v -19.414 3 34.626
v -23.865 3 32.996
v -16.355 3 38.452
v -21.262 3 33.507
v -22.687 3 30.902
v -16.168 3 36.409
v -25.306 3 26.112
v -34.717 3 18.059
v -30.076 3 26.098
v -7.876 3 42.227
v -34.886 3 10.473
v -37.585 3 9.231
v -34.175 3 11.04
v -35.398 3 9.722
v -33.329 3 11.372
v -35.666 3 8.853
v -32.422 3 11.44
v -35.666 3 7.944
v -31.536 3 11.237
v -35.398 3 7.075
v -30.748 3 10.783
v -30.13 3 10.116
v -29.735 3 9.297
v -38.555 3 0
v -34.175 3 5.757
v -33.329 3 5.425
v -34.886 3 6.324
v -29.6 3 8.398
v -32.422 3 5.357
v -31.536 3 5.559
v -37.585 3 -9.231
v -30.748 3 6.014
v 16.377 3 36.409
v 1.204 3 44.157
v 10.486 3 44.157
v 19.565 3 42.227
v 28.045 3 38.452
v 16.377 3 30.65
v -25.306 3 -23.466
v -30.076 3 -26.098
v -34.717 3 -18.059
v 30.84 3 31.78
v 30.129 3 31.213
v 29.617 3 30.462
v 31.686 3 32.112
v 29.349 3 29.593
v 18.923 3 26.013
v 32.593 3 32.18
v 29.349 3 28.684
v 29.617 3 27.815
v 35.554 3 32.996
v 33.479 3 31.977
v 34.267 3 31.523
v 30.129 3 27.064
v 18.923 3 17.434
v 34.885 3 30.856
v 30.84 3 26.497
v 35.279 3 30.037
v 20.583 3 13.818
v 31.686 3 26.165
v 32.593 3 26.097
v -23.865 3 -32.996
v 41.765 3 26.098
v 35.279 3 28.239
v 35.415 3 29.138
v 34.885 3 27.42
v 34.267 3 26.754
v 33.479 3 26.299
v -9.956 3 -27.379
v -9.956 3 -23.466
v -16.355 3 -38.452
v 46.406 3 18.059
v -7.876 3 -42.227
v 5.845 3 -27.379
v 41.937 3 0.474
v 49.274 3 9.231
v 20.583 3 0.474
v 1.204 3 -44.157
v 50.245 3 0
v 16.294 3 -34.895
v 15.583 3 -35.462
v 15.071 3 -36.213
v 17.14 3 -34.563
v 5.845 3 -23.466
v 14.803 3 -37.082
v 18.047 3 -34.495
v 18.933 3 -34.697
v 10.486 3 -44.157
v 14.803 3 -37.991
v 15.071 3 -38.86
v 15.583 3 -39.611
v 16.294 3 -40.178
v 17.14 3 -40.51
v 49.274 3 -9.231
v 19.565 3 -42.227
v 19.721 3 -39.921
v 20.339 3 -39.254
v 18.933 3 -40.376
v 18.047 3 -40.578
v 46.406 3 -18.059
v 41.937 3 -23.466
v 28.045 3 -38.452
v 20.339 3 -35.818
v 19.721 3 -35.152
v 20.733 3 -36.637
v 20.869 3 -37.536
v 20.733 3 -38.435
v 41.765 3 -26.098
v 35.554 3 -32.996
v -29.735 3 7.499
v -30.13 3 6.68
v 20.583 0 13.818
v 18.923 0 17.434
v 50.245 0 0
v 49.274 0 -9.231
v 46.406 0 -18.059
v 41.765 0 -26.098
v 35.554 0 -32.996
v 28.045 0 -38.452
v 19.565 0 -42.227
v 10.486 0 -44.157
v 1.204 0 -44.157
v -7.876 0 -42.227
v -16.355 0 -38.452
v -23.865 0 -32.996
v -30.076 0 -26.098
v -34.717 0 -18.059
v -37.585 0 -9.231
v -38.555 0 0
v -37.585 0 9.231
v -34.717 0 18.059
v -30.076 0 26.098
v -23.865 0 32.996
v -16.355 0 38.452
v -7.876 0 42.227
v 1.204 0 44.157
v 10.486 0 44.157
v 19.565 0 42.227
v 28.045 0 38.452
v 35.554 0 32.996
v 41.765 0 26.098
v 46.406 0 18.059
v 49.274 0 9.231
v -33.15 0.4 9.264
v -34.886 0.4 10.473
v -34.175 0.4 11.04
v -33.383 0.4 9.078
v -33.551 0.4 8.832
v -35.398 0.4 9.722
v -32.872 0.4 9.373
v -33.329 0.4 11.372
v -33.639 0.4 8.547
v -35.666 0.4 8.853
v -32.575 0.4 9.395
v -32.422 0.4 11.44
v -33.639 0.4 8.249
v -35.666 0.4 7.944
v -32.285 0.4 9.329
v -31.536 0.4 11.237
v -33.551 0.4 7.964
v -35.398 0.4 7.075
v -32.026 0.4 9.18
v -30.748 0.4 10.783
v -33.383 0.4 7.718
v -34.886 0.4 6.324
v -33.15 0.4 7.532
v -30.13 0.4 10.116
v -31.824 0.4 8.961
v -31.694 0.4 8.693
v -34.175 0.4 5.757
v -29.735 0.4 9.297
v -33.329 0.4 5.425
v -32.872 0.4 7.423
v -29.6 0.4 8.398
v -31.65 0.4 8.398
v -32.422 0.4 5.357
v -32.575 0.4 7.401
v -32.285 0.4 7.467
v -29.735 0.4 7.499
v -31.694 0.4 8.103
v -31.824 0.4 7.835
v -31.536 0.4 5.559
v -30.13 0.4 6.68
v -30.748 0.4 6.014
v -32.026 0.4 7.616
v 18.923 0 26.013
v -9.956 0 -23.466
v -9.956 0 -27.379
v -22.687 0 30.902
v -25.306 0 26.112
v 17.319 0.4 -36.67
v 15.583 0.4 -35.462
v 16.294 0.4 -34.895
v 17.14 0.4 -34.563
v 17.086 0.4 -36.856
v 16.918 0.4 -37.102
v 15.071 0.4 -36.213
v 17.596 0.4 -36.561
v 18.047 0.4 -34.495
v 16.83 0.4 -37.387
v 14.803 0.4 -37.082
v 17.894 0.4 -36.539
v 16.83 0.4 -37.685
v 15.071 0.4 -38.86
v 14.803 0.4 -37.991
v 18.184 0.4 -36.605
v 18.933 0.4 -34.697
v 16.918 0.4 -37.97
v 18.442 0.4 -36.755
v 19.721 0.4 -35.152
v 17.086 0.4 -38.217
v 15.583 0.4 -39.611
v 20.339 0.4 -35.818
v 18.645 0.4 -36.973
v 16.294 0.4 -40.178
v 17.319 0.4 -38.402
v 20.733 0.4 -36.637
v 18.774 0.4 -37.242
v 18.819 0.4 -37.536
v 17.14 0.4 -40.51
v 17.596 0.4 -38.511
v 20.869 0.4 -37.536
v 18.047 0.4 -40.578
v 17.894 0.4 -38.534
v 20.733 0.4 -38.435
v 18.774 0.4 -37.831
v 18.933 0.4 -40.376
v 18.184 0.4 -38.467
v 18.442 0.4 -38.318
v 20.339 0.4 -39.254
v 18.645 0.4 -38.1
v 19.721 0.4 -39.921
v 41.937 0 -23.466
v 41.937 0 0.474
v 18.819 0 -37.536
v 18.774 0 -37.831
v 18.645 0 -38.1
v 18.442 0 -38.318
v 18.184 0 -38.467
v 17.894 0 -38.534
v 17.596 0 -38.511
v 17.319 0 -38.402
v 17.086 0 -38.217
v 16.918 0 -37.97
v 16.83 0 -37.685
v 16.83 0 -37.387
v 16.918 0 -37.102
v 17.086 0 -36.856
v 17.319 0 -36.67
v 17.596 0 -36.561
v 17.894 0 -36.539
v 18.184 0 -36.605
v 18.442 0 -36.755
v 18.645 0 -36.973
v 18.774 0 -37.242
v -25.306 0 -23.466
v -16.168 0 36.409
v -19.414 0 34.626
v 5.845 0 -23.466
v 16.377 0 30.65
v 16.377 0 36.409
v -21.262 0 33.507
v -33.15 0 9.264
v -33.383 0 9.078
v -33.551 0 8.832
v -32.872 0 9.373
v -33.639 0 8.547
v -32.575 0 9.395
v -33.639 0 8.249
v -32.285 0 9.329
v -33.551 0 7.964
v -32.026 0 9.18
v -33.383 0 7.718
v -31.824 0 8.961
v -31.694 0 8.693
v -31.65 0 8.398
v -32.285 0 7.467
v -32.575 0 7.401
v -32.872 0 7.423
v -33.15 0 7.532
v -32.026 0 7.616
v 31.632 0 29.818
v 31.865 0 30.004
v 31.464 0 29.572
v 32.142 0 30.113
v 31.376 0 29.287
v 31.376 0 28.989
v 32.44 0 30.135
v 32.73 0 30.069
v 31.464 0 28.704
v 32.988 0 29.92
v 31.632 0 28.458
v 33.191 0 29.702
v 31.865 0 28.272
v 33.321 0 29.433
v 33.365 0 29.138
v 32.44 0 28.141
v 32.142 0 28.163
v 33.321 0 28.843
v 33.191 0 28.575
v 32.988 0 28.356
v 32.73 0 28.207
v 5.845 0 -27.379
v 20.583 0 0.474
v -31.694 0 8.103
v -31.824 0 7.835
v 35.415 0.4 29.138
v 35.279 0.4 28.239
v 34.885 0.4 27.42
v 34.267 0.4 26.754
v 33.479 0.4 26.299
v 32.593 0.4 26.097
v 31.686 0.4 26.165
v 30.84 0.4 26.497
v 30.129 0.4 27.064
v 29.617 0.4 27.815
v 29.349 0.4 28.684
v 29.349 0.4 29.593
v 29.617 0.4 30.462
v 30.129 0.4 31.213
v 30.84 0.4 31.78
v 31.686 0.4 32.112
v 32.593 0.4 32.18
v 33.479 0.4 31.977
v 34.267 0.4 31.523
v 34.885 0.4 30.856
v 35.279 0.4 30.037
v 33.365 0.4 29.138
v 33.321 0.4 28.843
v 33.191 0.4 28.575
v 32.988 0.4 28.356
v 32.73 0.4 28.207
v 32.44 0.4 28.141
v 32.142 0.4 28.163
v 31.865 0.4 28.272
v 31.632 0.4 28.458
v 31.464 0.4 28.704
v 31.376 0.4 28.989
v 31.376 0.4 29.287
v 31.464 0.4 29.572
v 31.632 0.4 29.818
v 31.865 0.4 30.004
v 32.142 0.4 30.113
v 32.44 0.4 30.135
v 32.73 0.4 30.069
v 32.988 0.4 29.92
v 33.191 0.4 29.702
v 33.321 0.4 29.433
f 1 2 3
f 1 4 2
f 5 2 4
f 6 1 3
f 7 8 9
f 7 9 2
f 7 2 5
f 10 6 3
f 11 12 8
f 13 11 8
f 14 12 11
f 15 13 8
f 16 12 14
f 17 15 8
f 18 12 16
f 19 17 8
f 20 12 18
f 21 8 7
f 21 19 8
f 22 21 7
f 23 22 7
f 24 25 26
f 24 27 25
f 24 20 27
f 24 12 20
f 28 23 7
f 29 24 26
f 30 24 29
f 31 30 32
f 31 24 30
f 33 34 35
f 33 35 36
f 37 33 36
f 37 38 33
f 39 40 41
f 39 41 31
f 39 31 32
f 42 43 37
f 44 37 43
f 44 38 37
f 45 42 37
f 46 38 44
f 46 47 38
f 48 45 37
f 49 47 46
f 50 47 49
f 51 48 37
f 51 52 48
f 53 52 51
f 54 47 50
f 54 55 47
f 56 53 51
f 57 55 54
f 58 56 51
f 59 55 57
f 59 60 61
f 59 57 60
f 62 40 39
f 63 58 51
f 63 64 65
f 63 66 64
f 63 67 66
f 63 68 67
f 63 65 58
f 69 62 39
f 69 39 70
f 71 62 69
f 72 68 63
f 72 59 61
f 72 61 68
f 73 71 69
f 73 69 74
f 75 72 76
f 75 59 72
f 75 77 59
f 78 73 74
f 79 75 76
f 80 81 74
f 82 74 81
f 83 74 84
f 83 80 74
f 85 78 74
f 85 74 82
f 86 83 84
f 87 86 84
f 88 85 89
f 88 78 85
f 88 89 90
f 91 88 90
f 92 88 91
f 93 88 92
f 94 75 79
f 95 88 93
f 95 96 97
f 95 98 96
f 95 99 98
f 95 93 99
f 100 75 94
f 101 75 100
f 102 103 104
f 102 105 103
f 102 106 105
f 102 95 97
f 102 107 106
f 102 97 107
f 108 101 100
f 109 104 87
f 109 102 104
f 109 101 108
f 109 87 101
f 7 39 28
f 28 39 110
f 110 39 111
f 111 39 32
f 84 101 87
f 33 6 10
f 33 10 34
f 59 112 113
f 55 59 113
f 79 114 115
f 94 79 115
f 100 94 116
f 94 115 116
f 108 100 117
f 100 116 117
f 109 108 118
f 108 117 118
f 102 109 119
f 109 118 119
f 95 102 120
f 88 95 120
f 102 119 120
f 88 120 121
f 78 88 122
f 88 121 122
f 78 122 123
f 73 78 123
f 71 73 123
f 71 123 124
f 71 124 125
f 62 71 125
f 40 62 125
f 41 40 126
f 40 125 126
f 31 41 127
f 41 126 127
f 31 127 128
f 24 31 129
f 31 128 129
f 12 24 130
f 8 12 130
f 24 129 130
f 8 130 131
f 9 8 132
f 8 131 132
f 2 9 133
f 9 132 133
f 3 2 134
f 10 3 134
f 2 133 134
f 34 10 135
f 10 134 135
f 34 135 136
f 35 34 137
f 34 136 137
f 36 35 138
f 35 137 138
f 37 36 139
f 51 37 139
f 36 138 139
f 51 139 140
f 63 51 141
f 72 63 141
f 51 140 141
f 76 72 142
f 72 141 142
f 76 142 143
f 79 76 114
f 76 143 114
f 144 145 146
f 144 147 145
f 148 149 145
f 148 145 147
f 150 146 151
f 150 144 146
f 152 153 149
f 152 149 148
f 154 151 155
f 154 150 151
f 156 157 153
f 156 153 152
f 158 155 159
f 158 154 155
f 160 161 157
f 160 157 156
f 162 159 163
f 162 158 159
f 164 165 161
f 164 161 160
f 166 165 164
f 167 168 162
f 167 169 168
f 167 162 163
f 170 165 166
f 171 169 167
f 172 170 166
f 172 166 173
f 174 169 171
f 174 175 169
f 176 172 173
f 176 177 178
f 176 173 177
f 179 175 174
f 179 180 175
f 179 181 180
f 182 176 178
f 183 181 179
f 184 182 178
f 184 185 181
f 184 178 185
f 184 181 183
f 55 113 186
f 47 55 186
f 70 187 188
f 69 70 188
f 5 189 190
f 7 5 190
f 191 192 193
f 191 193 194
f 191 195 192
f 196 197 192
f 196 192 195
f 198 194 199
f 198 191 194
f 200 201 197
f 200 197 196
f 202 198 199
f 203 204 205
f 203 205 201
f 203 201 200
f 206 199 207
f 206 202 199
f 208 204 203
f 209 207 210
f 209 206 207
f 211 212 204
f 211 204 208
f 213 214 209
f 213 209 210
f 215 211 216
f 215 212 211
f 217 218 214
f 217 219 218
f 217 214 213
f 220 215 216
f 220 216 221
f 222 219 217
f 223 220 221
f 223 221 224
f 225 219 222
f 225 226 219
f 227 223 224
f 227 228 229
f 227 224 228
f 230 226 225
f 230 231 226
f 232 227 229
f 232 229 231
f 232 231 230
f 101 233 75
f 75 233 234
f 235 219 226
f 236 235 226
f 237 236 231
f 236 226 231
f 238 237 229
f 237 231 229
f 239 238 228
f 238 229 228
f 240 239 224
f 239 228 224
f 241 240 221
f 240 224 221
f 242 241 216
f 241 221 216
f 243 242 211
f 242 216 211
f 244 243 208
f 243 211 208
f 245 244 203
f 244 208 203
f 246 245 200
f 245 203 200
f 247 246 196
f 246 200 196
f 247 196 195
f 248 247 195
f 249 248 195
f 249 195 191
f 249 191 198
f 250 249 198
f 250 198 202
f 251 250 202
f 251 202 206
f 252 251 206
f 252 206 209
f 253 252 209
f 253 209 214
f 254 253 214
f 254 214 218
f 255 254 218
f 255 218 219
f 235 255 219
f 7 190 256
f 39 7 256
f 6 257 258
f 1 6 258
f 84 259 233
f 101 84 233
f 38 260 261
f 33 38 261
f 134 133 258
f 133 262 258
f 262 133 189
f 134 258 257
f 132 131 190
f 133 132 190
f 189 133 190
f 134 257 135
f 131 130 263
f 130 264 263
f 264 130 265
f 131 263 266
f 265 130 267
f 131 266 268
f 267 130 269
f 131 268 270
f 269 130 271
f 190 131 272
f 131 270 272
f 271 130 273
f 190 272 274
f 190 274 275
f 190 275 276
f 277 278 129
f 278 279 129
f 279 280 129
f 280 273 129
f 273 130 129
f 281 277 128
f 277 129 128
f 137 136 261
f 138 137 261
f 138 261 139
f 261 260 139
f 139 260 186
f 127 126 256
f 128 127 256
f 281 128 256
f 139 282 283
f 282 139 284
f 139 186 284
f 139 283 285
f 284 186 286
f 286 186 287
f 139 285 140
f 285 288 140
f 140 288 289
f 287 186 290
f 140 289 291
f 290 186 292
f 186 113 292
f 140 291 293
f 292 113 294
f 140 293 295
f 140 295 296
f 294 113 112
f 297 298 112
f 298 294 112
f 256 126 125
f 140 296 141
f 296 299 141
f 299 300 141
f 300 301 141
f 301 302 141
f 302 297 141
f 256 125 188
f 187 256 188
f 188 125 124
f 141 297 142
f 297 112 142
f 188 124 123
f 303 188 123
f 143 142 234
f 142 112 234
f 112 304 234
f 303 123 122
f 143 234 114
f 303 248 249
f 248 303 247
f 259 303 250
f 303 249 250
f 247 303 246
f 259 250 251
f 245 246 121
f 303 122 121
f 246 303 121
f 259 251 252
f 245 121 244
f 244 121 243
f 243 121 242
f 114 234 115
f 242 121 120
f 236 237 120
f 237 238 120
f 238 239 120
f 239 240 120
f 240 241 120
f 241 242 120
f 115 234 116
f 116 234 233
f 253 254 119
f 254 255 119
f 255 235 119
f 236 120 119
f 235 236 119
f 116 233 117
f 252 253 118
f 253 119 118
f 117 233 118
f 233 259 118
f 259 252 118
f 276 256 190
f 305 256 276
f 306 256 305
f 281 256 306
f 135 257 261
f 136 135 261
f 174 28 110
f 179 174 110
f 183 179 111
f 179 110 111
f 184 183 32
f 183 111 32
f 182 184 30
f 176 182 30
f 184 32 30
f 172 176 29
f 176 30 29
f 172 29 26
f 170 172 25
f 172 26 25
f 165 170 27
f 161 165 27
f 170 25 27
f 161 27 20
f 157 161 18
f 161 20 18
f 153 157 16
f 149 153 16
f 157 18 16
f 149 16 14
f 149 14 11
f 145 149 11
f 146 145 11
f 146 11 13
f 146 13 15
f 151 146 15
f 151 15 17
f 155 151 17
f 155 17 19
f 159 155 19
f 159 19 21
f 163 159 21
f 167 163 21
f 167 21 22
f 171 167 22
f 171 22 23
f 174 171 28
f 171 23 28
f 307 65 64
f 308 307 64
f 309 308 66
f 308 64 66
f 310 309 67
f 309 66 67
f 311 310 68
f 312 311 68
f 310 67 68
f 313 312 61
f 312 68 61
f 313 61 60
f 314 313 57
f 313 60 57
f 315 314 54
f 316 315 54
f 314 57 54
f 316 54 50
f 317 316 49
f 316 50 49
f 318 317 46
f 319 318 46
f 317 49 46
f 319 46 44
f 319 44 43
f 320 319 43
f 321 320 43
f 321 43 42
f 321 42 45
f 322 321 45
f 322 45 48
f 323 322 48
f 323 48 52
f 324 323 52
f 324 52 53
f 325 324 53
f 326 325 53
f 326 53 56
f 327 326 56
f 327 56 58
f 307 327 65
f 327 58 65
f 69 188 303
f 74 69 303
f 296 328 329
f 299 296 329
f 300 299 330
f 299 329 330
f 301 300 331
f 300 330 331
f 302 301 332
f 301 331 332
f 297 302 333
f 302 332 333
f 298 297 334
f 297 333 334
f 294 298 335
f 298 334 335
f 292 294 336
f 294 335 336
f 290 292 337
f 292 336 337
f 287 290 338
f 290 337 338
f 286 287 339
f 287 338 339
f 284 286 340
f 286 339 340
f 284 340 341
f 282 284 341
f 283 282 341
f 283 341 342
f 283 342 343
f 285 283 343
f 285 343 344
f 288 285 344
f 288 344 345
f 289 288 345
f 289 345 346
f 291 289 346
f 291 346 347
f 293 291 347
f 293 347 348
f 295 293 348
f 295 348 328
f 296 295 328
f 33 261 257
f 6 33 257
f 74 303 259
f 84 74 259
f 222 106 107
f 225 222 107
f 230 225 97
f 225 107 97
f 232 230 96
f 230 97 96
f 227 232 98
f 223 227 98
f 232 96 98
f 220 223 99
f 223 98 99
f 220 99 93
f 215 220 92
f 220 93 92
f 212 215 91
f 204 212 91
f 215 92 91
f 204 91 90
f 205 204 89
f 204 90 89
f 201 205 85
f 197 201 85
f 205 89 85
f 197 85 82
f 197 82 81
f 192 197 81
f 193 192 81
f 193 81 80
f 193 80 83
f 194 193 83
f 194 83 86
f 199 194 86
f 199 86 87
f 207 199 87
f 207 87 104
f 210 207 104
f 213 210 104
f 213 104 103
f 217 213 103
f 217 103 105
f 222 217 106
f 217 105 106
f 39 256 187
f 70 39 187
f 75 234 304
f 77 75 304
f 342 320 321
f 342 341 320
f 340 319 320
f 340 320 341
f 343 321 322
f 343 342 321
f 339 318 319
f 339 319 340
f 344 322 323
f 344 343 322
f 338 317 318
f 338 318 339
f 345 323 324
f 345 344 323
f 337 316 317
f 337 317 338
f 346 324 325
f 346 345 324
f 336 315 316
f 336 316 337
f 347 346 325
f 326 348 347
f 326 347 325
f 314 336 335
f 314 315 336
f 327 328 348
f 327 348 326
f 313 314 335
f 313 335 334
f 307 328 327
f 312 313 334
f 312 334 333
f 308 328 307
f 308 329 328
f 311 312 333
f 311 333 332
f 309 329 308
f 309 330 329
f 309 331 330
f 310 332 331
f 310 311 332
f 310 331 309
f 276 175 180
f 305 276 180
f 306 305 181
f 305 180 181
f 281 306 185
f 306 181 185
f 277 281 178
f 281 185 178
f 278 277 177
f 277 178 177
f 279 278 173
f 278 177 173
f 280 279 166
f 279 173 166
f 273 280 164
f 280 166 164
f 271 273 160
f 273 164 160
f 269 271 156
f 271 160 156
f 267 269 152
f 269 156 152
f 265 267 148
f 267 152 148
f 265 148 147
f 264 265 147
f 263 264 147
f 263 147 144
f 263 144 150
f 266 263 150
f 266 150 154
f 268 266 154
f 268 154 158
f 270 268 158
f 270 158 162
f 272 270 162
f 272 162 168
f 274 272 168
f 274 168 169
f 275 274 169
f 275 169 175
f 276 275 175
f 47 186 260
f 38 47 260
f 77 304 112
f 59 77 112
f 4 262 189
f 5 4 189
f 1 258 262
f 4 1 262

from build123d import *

# Parameters (mm, degrees)
SKETCH2_R           = 44.4
BOSS_EXTRUDE1_DEPTH = 3
CUT_EXTRUDE3_START  = 3
SKETCH3_R           = 3.05
CUT_EXTRUDE3_DEPTH  = 2.6
SKETCH4_R           = 1
CUT_EXTRUDE4_DEPTH  = 1.4


with BuildPart() as part:
    # Sketch2 → Boss-Extrude1 (new body)
    with BuildSketch(Plane(origin=(0, 0, 0), x_dir=(1, 0, 0), z_dir=(0, 1, 0))):
        with Locations((5.844668035, 0)):
            Circle(SKETCH2_R)
        Polygon((-25.306151193, 23.466427606), (-9.956472153, 23.466427606), (-9.956472153, 27.379090891), (5.844668035, 27.379090891), (5.844668035, 23.466427606), (41.936760168, 23.466427606), (41.936760168, -0.473949831), (20.582698865, -0.473949831), (20.582698865, -13.817632751), (18.922929974, -17.433557834), (18.922929974, -26.013051917), (16.376674503, -30.649762231), (16.376674503, -36.409044515), (-16.167559029, -36.409044515), (-19.414149946, -34.62617491), (-21.26171293, -33.507445335), (-22.686577877, -30.901858186), (-25.306151193, -26.111560985), align=None, mode=Mode.SUBTRACT)
    extrude(amount=BOSS_EXTRUDE1_DEPTH)

    # Sketch3 → Cut-Extrude3 (cut)
    with BuildSketch(Plane(origin=(0, 0, 0), x_dir=(1, 0, 0), z_dir=(0, 1, 0)).offset(CUT_EXTRUDE3_START)):
        with Locations((32.364967514, -29.138183119)):
            Circle(SKETCH3_R)
        with Locations((17.818925096, 37.536344625)):
            Circle(SKETCH3_R)
        with Locations((-32.649888507, -8.398161506)):
            Circle(SKETCH3_R)
    extrude(amount=-CUT_EXTRUDE3_DEPTH, mode=Mode.SUBTRACT)

    # Sketch4 → Cut-Extrude4 (cut, through all)
    with BuildSketch(Plane(origin=(0, 0.4, 0), x_dir=(1, 0, 0), z_dir=(0, 1, 0))):
        with Locations((-32.649888507, -8.398161506)):
            Circle(SKETCH4_R)
        with Locations((17.818925096, 37.536344625)):
            Circle(SKETCH4_R)
        with Locations((32.364967514, -29.138183119)):
            Circle(SKETCH4_R)
    extrude(amount=-CUT_EXTRUDE4_DEPTH, mode=Mode.SUBTRACT)


solid = part.part
